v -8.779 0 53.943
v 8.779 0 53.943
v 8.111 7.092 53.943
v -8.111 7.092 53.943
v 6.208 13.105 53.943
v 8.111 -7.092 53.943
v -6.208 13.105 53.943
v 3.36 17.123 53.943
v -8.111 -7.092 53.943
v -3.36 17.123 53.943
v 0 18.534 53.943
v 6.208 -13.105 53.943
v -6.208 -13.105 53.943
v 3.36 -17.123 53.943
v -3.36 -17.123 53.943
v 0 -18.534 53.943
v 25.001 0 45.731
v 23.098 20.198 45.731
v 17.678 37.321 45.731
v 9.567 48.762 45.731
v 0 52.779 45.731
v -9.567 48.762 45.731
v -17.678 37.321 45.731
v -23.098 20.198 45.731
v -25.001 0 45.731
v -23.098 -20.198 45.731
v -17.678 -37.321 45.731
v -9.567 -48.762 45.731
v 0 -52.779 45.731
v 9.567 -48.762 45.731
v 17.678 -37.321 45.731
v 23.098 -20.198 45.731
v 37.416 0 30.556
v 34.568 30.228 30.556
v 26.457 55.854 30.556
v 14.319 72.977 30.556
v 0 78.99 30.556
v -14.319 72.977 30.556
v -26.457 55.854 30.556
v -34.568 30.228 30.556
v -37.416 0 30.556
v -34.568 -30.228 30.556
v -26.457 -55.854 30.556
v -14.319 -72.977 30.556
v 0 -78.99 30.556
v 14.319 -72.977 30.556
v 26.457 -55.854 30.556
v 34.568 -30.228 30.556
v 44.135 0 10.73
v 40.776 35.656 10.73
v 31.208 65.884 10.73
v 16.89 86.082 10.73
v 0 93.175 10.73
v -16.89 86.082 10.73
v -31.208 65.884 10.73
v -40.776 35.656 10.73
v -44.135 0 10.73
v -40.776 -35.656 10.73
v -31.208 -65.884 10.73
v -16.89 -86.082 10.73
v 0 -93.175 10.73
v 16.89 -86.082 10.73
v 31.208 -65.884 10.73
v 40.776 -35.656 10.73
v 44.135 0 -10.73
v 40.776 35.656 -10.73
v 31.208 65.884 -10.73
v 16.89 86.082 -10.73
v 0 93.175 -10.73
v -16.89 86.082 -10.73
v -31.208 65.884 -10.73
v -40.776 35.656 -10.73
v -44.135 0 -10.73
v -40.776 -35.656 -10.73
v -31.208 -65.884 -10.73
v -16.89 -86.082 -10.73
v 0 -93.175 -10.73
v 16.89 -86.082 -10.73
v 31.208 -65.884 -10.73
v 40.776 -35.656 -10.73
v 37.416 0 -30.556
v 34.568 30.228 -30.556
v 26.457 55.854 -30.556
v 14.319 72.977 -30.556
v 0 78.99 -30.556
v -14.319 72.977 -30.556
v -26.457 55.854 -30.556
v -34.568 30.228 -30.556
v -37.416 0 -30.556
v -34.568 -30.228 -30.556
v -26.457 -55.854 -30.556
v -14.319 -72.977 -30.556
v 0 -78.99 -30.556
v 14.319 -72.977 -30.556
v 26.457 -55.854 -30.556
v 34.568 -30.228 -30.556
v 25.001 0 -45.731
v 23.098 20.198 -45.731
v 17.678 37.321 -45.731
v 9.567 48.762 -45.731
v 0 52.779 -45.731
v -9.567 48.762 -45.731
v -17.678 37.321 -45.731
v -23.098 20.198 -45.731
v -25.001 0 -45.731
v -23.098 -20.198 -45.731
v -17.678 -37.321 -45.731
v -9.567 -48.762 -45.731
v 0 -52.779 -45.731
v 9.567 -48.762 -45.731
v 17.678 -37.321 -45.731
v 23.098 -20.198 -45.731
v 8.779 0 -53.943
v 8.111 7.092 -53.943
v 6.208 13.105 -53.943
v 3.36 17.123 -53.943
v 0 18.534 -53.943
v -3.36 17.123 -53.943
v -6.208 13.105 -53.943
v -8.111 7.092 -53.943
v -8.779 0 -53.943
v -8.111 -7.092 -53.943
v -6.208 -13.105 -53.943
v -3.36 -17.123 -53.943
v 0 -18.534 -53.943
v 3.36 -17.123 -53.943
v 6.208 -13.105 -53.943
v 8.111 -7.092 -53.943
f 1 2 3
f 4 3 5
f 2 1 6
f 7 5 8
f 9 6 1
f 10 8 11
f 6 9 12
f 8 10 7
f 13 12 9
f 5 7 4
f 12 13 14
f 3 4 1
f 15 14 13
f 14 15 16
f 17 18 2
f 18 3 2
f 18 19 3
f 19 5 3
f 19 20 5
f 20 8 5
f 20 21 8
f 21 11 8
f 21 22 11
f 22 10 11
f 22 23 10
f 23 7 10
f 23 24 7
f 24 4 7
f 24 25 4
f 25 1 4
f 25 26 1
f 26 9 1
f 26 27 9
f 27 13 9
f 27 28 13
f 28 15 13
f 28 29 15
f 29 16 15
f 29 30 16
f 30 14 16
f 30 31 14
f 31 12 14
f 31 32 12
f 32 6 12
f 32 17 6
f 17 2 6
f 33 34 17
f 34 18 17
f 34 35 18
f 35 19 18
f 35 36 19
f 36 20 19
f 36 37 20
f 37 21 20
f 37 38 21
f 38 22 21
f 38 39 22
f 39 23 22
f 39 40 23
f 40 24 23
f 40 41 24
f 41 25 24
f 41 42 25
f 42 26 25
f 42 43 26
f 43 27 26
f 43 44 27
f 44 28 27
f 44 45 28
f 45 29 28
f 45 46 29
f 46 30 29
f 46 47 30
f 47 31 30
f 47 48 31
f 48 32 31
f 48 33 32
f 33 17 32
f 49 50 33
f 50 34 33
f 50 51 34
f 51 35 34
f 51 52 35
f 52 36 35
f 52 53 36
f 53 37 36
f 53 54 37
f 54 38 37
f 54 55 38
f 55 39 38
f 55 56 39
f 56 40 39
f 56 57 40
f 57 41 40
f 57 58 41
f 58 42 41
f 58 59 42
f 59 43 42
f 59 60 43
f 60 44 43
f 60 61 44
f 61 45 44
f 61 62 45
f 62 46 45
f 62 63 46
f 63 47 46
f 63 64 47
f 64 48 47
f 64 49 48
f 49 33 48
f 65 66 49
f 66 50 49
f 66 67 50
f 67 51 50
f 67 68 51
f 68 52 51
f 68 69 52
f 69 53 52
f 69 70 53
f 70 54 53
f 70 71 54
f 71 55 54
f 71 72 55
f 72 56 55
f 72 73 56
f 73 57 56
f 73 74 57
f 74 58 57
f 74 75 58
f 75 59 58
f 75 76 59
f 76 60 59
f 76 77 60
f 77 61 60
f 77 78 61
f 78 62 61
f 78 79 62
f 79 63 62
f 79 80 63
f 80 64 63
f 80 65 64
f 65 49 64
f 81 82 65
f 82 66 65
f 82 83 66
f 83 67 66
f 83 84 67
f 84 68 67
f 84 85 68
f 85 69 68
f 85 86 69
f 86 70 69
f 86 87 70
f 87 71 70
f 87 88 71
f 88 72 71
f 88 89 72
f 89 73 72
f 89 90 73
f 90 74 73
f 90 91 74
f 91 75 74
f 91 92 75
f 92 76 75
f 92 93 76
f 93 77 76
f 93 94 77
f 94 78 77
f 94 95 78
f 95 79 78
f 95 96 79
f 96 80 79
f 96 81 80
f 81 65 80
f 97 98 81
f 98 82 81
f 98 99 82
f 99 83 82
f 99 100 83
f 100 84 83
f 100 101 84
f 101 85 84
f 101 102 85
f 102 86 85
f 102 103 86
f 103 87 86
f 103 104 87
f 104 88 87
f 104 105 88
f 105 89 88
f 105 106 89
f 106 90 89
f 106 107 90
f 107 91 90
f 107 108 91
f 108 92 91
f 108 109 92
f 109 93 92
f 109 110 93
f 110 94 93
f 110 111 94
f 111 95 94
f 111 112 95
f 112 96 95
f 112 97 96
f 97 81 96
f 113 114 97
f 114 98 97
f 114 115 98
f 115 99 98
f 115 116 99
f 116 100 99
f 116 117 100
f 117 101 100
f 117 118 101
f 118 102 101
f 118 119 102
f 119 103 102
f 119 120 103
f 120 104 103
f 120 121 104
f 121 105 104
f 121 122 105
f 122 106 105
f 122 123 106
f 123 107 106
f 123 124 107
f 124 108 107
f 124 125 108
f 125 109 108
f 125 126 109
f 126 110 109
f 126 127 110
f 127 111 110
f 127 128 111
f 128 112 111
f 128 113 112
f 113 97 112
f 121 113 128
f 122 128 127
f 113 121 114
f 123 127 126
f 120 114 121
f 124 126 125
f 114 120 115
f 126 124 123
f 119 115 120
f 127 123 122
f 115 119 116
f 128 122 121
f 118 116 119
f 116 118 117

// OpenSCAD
// Generated by SolidPython 1.0.1 on 2020-07-29 00:46:49


scale(v = [9, 19, 11]) {
	sphere(r = 5);
}
/***********************************************
*********      SolidPython code:      **********
************************************************
 
# import packages: SolidPython
from solid import *
from solid.utils import *
from itertools import chain, combinations, permutations


class Resize:

    def __init__(self, scad_file):
        self.scad_file = scad_file
        #self.scad_file = import_scad(scad_file)
        # cone/cylinder param:
        self.r1 = 0
        self.r2 = 0
        self.h = 0
        # rectangular prism param:
        self.w = 0
        self.l = 0
        # ellipse param:
        self.r = 0

    # import OpenScad code (file name corresponds to shape)


    # classify shape + parameters
    def assign(self, param1, param2, param3):
        if self.scad_file == 'cone.scad':
            self.r1 = param1
            self.r2 = param2
            self.h = param3
        elif self.scad_file == 'cylinder.scad':
            self.r1 = param1
            self.r2 = param2
            self.h = param3
        elif self.scad_file == 'rectangularPrism.scad':
            self.h = param1
            self.l = param2
            self.w = param3
        else:
            self.r = param1
            self.h = param2

    # resize parameters
    def iterate(self):
        x = range(3, 20, 2)
        i = 1
        if self.scad_file == 'cone.scad':
            tempList = list(permutations(x, 2))
            for temp in tempList:
                param1 = temp[0]
                param2 = temp[1]
                filepath = 'produced_scad_files/' + 'cone' + str(param1) + '_' + str(param2) + '_' + '.scad'
                scad_render_to_file(cylinder(h=param1, r1=param2, r2=0), filepath)

        elif self.scad_file == 'cylinder.scad':
            tempList = list(permutations(x, 3))
            for temp in tempList:
                param1 = temp[0]
                param2 = temp[1]
                filepath = 'produced_scad_files/' + 'cylinder' + str(param1) + '_' + str(param2) + '_' + '.scad'
                scad_render_to_file(cylinder(h=param1, r1=param2, r2=param2), filepath)

        elif self.scad_file == 'rectangularPrism.scad':
            tempList = list(permutations(x, 3))
            for temp in tempList:
                param1 = temp[0]
                param2 = temp[1]
                param3 = temp[2]
                filepath = 'produced_scad_files/' + 'rectangularPrism' + str(param1) + '_' + str(param2) + '_' + str(
                    param3) + '.scad'
                scad_render_to_file(cube(size=(param1, param2, param3)), filepath)

        elif self.scad_file == 'ellipse.scad':
            tempList = list(permutations(x, 4))
            for temp in tempList:
                param1 = temp[0]
                param2 = temp[1]
                param3 = temp[2]
                param4 = temp[3]
                filepath = 'produced_scad_files/' + 'ellipse' + str(param1) + '_' + str(param2) + '_' + str(param3) + '_' + str(param4) + '.scad'
                scad_render_to_file(scale([param1, param2, param3])(sphere(r=param4)), filepath)

    def render_to_scadfile(self):
        scad_render_to_file(scad, 'example.scad') 
 
************************************************/
